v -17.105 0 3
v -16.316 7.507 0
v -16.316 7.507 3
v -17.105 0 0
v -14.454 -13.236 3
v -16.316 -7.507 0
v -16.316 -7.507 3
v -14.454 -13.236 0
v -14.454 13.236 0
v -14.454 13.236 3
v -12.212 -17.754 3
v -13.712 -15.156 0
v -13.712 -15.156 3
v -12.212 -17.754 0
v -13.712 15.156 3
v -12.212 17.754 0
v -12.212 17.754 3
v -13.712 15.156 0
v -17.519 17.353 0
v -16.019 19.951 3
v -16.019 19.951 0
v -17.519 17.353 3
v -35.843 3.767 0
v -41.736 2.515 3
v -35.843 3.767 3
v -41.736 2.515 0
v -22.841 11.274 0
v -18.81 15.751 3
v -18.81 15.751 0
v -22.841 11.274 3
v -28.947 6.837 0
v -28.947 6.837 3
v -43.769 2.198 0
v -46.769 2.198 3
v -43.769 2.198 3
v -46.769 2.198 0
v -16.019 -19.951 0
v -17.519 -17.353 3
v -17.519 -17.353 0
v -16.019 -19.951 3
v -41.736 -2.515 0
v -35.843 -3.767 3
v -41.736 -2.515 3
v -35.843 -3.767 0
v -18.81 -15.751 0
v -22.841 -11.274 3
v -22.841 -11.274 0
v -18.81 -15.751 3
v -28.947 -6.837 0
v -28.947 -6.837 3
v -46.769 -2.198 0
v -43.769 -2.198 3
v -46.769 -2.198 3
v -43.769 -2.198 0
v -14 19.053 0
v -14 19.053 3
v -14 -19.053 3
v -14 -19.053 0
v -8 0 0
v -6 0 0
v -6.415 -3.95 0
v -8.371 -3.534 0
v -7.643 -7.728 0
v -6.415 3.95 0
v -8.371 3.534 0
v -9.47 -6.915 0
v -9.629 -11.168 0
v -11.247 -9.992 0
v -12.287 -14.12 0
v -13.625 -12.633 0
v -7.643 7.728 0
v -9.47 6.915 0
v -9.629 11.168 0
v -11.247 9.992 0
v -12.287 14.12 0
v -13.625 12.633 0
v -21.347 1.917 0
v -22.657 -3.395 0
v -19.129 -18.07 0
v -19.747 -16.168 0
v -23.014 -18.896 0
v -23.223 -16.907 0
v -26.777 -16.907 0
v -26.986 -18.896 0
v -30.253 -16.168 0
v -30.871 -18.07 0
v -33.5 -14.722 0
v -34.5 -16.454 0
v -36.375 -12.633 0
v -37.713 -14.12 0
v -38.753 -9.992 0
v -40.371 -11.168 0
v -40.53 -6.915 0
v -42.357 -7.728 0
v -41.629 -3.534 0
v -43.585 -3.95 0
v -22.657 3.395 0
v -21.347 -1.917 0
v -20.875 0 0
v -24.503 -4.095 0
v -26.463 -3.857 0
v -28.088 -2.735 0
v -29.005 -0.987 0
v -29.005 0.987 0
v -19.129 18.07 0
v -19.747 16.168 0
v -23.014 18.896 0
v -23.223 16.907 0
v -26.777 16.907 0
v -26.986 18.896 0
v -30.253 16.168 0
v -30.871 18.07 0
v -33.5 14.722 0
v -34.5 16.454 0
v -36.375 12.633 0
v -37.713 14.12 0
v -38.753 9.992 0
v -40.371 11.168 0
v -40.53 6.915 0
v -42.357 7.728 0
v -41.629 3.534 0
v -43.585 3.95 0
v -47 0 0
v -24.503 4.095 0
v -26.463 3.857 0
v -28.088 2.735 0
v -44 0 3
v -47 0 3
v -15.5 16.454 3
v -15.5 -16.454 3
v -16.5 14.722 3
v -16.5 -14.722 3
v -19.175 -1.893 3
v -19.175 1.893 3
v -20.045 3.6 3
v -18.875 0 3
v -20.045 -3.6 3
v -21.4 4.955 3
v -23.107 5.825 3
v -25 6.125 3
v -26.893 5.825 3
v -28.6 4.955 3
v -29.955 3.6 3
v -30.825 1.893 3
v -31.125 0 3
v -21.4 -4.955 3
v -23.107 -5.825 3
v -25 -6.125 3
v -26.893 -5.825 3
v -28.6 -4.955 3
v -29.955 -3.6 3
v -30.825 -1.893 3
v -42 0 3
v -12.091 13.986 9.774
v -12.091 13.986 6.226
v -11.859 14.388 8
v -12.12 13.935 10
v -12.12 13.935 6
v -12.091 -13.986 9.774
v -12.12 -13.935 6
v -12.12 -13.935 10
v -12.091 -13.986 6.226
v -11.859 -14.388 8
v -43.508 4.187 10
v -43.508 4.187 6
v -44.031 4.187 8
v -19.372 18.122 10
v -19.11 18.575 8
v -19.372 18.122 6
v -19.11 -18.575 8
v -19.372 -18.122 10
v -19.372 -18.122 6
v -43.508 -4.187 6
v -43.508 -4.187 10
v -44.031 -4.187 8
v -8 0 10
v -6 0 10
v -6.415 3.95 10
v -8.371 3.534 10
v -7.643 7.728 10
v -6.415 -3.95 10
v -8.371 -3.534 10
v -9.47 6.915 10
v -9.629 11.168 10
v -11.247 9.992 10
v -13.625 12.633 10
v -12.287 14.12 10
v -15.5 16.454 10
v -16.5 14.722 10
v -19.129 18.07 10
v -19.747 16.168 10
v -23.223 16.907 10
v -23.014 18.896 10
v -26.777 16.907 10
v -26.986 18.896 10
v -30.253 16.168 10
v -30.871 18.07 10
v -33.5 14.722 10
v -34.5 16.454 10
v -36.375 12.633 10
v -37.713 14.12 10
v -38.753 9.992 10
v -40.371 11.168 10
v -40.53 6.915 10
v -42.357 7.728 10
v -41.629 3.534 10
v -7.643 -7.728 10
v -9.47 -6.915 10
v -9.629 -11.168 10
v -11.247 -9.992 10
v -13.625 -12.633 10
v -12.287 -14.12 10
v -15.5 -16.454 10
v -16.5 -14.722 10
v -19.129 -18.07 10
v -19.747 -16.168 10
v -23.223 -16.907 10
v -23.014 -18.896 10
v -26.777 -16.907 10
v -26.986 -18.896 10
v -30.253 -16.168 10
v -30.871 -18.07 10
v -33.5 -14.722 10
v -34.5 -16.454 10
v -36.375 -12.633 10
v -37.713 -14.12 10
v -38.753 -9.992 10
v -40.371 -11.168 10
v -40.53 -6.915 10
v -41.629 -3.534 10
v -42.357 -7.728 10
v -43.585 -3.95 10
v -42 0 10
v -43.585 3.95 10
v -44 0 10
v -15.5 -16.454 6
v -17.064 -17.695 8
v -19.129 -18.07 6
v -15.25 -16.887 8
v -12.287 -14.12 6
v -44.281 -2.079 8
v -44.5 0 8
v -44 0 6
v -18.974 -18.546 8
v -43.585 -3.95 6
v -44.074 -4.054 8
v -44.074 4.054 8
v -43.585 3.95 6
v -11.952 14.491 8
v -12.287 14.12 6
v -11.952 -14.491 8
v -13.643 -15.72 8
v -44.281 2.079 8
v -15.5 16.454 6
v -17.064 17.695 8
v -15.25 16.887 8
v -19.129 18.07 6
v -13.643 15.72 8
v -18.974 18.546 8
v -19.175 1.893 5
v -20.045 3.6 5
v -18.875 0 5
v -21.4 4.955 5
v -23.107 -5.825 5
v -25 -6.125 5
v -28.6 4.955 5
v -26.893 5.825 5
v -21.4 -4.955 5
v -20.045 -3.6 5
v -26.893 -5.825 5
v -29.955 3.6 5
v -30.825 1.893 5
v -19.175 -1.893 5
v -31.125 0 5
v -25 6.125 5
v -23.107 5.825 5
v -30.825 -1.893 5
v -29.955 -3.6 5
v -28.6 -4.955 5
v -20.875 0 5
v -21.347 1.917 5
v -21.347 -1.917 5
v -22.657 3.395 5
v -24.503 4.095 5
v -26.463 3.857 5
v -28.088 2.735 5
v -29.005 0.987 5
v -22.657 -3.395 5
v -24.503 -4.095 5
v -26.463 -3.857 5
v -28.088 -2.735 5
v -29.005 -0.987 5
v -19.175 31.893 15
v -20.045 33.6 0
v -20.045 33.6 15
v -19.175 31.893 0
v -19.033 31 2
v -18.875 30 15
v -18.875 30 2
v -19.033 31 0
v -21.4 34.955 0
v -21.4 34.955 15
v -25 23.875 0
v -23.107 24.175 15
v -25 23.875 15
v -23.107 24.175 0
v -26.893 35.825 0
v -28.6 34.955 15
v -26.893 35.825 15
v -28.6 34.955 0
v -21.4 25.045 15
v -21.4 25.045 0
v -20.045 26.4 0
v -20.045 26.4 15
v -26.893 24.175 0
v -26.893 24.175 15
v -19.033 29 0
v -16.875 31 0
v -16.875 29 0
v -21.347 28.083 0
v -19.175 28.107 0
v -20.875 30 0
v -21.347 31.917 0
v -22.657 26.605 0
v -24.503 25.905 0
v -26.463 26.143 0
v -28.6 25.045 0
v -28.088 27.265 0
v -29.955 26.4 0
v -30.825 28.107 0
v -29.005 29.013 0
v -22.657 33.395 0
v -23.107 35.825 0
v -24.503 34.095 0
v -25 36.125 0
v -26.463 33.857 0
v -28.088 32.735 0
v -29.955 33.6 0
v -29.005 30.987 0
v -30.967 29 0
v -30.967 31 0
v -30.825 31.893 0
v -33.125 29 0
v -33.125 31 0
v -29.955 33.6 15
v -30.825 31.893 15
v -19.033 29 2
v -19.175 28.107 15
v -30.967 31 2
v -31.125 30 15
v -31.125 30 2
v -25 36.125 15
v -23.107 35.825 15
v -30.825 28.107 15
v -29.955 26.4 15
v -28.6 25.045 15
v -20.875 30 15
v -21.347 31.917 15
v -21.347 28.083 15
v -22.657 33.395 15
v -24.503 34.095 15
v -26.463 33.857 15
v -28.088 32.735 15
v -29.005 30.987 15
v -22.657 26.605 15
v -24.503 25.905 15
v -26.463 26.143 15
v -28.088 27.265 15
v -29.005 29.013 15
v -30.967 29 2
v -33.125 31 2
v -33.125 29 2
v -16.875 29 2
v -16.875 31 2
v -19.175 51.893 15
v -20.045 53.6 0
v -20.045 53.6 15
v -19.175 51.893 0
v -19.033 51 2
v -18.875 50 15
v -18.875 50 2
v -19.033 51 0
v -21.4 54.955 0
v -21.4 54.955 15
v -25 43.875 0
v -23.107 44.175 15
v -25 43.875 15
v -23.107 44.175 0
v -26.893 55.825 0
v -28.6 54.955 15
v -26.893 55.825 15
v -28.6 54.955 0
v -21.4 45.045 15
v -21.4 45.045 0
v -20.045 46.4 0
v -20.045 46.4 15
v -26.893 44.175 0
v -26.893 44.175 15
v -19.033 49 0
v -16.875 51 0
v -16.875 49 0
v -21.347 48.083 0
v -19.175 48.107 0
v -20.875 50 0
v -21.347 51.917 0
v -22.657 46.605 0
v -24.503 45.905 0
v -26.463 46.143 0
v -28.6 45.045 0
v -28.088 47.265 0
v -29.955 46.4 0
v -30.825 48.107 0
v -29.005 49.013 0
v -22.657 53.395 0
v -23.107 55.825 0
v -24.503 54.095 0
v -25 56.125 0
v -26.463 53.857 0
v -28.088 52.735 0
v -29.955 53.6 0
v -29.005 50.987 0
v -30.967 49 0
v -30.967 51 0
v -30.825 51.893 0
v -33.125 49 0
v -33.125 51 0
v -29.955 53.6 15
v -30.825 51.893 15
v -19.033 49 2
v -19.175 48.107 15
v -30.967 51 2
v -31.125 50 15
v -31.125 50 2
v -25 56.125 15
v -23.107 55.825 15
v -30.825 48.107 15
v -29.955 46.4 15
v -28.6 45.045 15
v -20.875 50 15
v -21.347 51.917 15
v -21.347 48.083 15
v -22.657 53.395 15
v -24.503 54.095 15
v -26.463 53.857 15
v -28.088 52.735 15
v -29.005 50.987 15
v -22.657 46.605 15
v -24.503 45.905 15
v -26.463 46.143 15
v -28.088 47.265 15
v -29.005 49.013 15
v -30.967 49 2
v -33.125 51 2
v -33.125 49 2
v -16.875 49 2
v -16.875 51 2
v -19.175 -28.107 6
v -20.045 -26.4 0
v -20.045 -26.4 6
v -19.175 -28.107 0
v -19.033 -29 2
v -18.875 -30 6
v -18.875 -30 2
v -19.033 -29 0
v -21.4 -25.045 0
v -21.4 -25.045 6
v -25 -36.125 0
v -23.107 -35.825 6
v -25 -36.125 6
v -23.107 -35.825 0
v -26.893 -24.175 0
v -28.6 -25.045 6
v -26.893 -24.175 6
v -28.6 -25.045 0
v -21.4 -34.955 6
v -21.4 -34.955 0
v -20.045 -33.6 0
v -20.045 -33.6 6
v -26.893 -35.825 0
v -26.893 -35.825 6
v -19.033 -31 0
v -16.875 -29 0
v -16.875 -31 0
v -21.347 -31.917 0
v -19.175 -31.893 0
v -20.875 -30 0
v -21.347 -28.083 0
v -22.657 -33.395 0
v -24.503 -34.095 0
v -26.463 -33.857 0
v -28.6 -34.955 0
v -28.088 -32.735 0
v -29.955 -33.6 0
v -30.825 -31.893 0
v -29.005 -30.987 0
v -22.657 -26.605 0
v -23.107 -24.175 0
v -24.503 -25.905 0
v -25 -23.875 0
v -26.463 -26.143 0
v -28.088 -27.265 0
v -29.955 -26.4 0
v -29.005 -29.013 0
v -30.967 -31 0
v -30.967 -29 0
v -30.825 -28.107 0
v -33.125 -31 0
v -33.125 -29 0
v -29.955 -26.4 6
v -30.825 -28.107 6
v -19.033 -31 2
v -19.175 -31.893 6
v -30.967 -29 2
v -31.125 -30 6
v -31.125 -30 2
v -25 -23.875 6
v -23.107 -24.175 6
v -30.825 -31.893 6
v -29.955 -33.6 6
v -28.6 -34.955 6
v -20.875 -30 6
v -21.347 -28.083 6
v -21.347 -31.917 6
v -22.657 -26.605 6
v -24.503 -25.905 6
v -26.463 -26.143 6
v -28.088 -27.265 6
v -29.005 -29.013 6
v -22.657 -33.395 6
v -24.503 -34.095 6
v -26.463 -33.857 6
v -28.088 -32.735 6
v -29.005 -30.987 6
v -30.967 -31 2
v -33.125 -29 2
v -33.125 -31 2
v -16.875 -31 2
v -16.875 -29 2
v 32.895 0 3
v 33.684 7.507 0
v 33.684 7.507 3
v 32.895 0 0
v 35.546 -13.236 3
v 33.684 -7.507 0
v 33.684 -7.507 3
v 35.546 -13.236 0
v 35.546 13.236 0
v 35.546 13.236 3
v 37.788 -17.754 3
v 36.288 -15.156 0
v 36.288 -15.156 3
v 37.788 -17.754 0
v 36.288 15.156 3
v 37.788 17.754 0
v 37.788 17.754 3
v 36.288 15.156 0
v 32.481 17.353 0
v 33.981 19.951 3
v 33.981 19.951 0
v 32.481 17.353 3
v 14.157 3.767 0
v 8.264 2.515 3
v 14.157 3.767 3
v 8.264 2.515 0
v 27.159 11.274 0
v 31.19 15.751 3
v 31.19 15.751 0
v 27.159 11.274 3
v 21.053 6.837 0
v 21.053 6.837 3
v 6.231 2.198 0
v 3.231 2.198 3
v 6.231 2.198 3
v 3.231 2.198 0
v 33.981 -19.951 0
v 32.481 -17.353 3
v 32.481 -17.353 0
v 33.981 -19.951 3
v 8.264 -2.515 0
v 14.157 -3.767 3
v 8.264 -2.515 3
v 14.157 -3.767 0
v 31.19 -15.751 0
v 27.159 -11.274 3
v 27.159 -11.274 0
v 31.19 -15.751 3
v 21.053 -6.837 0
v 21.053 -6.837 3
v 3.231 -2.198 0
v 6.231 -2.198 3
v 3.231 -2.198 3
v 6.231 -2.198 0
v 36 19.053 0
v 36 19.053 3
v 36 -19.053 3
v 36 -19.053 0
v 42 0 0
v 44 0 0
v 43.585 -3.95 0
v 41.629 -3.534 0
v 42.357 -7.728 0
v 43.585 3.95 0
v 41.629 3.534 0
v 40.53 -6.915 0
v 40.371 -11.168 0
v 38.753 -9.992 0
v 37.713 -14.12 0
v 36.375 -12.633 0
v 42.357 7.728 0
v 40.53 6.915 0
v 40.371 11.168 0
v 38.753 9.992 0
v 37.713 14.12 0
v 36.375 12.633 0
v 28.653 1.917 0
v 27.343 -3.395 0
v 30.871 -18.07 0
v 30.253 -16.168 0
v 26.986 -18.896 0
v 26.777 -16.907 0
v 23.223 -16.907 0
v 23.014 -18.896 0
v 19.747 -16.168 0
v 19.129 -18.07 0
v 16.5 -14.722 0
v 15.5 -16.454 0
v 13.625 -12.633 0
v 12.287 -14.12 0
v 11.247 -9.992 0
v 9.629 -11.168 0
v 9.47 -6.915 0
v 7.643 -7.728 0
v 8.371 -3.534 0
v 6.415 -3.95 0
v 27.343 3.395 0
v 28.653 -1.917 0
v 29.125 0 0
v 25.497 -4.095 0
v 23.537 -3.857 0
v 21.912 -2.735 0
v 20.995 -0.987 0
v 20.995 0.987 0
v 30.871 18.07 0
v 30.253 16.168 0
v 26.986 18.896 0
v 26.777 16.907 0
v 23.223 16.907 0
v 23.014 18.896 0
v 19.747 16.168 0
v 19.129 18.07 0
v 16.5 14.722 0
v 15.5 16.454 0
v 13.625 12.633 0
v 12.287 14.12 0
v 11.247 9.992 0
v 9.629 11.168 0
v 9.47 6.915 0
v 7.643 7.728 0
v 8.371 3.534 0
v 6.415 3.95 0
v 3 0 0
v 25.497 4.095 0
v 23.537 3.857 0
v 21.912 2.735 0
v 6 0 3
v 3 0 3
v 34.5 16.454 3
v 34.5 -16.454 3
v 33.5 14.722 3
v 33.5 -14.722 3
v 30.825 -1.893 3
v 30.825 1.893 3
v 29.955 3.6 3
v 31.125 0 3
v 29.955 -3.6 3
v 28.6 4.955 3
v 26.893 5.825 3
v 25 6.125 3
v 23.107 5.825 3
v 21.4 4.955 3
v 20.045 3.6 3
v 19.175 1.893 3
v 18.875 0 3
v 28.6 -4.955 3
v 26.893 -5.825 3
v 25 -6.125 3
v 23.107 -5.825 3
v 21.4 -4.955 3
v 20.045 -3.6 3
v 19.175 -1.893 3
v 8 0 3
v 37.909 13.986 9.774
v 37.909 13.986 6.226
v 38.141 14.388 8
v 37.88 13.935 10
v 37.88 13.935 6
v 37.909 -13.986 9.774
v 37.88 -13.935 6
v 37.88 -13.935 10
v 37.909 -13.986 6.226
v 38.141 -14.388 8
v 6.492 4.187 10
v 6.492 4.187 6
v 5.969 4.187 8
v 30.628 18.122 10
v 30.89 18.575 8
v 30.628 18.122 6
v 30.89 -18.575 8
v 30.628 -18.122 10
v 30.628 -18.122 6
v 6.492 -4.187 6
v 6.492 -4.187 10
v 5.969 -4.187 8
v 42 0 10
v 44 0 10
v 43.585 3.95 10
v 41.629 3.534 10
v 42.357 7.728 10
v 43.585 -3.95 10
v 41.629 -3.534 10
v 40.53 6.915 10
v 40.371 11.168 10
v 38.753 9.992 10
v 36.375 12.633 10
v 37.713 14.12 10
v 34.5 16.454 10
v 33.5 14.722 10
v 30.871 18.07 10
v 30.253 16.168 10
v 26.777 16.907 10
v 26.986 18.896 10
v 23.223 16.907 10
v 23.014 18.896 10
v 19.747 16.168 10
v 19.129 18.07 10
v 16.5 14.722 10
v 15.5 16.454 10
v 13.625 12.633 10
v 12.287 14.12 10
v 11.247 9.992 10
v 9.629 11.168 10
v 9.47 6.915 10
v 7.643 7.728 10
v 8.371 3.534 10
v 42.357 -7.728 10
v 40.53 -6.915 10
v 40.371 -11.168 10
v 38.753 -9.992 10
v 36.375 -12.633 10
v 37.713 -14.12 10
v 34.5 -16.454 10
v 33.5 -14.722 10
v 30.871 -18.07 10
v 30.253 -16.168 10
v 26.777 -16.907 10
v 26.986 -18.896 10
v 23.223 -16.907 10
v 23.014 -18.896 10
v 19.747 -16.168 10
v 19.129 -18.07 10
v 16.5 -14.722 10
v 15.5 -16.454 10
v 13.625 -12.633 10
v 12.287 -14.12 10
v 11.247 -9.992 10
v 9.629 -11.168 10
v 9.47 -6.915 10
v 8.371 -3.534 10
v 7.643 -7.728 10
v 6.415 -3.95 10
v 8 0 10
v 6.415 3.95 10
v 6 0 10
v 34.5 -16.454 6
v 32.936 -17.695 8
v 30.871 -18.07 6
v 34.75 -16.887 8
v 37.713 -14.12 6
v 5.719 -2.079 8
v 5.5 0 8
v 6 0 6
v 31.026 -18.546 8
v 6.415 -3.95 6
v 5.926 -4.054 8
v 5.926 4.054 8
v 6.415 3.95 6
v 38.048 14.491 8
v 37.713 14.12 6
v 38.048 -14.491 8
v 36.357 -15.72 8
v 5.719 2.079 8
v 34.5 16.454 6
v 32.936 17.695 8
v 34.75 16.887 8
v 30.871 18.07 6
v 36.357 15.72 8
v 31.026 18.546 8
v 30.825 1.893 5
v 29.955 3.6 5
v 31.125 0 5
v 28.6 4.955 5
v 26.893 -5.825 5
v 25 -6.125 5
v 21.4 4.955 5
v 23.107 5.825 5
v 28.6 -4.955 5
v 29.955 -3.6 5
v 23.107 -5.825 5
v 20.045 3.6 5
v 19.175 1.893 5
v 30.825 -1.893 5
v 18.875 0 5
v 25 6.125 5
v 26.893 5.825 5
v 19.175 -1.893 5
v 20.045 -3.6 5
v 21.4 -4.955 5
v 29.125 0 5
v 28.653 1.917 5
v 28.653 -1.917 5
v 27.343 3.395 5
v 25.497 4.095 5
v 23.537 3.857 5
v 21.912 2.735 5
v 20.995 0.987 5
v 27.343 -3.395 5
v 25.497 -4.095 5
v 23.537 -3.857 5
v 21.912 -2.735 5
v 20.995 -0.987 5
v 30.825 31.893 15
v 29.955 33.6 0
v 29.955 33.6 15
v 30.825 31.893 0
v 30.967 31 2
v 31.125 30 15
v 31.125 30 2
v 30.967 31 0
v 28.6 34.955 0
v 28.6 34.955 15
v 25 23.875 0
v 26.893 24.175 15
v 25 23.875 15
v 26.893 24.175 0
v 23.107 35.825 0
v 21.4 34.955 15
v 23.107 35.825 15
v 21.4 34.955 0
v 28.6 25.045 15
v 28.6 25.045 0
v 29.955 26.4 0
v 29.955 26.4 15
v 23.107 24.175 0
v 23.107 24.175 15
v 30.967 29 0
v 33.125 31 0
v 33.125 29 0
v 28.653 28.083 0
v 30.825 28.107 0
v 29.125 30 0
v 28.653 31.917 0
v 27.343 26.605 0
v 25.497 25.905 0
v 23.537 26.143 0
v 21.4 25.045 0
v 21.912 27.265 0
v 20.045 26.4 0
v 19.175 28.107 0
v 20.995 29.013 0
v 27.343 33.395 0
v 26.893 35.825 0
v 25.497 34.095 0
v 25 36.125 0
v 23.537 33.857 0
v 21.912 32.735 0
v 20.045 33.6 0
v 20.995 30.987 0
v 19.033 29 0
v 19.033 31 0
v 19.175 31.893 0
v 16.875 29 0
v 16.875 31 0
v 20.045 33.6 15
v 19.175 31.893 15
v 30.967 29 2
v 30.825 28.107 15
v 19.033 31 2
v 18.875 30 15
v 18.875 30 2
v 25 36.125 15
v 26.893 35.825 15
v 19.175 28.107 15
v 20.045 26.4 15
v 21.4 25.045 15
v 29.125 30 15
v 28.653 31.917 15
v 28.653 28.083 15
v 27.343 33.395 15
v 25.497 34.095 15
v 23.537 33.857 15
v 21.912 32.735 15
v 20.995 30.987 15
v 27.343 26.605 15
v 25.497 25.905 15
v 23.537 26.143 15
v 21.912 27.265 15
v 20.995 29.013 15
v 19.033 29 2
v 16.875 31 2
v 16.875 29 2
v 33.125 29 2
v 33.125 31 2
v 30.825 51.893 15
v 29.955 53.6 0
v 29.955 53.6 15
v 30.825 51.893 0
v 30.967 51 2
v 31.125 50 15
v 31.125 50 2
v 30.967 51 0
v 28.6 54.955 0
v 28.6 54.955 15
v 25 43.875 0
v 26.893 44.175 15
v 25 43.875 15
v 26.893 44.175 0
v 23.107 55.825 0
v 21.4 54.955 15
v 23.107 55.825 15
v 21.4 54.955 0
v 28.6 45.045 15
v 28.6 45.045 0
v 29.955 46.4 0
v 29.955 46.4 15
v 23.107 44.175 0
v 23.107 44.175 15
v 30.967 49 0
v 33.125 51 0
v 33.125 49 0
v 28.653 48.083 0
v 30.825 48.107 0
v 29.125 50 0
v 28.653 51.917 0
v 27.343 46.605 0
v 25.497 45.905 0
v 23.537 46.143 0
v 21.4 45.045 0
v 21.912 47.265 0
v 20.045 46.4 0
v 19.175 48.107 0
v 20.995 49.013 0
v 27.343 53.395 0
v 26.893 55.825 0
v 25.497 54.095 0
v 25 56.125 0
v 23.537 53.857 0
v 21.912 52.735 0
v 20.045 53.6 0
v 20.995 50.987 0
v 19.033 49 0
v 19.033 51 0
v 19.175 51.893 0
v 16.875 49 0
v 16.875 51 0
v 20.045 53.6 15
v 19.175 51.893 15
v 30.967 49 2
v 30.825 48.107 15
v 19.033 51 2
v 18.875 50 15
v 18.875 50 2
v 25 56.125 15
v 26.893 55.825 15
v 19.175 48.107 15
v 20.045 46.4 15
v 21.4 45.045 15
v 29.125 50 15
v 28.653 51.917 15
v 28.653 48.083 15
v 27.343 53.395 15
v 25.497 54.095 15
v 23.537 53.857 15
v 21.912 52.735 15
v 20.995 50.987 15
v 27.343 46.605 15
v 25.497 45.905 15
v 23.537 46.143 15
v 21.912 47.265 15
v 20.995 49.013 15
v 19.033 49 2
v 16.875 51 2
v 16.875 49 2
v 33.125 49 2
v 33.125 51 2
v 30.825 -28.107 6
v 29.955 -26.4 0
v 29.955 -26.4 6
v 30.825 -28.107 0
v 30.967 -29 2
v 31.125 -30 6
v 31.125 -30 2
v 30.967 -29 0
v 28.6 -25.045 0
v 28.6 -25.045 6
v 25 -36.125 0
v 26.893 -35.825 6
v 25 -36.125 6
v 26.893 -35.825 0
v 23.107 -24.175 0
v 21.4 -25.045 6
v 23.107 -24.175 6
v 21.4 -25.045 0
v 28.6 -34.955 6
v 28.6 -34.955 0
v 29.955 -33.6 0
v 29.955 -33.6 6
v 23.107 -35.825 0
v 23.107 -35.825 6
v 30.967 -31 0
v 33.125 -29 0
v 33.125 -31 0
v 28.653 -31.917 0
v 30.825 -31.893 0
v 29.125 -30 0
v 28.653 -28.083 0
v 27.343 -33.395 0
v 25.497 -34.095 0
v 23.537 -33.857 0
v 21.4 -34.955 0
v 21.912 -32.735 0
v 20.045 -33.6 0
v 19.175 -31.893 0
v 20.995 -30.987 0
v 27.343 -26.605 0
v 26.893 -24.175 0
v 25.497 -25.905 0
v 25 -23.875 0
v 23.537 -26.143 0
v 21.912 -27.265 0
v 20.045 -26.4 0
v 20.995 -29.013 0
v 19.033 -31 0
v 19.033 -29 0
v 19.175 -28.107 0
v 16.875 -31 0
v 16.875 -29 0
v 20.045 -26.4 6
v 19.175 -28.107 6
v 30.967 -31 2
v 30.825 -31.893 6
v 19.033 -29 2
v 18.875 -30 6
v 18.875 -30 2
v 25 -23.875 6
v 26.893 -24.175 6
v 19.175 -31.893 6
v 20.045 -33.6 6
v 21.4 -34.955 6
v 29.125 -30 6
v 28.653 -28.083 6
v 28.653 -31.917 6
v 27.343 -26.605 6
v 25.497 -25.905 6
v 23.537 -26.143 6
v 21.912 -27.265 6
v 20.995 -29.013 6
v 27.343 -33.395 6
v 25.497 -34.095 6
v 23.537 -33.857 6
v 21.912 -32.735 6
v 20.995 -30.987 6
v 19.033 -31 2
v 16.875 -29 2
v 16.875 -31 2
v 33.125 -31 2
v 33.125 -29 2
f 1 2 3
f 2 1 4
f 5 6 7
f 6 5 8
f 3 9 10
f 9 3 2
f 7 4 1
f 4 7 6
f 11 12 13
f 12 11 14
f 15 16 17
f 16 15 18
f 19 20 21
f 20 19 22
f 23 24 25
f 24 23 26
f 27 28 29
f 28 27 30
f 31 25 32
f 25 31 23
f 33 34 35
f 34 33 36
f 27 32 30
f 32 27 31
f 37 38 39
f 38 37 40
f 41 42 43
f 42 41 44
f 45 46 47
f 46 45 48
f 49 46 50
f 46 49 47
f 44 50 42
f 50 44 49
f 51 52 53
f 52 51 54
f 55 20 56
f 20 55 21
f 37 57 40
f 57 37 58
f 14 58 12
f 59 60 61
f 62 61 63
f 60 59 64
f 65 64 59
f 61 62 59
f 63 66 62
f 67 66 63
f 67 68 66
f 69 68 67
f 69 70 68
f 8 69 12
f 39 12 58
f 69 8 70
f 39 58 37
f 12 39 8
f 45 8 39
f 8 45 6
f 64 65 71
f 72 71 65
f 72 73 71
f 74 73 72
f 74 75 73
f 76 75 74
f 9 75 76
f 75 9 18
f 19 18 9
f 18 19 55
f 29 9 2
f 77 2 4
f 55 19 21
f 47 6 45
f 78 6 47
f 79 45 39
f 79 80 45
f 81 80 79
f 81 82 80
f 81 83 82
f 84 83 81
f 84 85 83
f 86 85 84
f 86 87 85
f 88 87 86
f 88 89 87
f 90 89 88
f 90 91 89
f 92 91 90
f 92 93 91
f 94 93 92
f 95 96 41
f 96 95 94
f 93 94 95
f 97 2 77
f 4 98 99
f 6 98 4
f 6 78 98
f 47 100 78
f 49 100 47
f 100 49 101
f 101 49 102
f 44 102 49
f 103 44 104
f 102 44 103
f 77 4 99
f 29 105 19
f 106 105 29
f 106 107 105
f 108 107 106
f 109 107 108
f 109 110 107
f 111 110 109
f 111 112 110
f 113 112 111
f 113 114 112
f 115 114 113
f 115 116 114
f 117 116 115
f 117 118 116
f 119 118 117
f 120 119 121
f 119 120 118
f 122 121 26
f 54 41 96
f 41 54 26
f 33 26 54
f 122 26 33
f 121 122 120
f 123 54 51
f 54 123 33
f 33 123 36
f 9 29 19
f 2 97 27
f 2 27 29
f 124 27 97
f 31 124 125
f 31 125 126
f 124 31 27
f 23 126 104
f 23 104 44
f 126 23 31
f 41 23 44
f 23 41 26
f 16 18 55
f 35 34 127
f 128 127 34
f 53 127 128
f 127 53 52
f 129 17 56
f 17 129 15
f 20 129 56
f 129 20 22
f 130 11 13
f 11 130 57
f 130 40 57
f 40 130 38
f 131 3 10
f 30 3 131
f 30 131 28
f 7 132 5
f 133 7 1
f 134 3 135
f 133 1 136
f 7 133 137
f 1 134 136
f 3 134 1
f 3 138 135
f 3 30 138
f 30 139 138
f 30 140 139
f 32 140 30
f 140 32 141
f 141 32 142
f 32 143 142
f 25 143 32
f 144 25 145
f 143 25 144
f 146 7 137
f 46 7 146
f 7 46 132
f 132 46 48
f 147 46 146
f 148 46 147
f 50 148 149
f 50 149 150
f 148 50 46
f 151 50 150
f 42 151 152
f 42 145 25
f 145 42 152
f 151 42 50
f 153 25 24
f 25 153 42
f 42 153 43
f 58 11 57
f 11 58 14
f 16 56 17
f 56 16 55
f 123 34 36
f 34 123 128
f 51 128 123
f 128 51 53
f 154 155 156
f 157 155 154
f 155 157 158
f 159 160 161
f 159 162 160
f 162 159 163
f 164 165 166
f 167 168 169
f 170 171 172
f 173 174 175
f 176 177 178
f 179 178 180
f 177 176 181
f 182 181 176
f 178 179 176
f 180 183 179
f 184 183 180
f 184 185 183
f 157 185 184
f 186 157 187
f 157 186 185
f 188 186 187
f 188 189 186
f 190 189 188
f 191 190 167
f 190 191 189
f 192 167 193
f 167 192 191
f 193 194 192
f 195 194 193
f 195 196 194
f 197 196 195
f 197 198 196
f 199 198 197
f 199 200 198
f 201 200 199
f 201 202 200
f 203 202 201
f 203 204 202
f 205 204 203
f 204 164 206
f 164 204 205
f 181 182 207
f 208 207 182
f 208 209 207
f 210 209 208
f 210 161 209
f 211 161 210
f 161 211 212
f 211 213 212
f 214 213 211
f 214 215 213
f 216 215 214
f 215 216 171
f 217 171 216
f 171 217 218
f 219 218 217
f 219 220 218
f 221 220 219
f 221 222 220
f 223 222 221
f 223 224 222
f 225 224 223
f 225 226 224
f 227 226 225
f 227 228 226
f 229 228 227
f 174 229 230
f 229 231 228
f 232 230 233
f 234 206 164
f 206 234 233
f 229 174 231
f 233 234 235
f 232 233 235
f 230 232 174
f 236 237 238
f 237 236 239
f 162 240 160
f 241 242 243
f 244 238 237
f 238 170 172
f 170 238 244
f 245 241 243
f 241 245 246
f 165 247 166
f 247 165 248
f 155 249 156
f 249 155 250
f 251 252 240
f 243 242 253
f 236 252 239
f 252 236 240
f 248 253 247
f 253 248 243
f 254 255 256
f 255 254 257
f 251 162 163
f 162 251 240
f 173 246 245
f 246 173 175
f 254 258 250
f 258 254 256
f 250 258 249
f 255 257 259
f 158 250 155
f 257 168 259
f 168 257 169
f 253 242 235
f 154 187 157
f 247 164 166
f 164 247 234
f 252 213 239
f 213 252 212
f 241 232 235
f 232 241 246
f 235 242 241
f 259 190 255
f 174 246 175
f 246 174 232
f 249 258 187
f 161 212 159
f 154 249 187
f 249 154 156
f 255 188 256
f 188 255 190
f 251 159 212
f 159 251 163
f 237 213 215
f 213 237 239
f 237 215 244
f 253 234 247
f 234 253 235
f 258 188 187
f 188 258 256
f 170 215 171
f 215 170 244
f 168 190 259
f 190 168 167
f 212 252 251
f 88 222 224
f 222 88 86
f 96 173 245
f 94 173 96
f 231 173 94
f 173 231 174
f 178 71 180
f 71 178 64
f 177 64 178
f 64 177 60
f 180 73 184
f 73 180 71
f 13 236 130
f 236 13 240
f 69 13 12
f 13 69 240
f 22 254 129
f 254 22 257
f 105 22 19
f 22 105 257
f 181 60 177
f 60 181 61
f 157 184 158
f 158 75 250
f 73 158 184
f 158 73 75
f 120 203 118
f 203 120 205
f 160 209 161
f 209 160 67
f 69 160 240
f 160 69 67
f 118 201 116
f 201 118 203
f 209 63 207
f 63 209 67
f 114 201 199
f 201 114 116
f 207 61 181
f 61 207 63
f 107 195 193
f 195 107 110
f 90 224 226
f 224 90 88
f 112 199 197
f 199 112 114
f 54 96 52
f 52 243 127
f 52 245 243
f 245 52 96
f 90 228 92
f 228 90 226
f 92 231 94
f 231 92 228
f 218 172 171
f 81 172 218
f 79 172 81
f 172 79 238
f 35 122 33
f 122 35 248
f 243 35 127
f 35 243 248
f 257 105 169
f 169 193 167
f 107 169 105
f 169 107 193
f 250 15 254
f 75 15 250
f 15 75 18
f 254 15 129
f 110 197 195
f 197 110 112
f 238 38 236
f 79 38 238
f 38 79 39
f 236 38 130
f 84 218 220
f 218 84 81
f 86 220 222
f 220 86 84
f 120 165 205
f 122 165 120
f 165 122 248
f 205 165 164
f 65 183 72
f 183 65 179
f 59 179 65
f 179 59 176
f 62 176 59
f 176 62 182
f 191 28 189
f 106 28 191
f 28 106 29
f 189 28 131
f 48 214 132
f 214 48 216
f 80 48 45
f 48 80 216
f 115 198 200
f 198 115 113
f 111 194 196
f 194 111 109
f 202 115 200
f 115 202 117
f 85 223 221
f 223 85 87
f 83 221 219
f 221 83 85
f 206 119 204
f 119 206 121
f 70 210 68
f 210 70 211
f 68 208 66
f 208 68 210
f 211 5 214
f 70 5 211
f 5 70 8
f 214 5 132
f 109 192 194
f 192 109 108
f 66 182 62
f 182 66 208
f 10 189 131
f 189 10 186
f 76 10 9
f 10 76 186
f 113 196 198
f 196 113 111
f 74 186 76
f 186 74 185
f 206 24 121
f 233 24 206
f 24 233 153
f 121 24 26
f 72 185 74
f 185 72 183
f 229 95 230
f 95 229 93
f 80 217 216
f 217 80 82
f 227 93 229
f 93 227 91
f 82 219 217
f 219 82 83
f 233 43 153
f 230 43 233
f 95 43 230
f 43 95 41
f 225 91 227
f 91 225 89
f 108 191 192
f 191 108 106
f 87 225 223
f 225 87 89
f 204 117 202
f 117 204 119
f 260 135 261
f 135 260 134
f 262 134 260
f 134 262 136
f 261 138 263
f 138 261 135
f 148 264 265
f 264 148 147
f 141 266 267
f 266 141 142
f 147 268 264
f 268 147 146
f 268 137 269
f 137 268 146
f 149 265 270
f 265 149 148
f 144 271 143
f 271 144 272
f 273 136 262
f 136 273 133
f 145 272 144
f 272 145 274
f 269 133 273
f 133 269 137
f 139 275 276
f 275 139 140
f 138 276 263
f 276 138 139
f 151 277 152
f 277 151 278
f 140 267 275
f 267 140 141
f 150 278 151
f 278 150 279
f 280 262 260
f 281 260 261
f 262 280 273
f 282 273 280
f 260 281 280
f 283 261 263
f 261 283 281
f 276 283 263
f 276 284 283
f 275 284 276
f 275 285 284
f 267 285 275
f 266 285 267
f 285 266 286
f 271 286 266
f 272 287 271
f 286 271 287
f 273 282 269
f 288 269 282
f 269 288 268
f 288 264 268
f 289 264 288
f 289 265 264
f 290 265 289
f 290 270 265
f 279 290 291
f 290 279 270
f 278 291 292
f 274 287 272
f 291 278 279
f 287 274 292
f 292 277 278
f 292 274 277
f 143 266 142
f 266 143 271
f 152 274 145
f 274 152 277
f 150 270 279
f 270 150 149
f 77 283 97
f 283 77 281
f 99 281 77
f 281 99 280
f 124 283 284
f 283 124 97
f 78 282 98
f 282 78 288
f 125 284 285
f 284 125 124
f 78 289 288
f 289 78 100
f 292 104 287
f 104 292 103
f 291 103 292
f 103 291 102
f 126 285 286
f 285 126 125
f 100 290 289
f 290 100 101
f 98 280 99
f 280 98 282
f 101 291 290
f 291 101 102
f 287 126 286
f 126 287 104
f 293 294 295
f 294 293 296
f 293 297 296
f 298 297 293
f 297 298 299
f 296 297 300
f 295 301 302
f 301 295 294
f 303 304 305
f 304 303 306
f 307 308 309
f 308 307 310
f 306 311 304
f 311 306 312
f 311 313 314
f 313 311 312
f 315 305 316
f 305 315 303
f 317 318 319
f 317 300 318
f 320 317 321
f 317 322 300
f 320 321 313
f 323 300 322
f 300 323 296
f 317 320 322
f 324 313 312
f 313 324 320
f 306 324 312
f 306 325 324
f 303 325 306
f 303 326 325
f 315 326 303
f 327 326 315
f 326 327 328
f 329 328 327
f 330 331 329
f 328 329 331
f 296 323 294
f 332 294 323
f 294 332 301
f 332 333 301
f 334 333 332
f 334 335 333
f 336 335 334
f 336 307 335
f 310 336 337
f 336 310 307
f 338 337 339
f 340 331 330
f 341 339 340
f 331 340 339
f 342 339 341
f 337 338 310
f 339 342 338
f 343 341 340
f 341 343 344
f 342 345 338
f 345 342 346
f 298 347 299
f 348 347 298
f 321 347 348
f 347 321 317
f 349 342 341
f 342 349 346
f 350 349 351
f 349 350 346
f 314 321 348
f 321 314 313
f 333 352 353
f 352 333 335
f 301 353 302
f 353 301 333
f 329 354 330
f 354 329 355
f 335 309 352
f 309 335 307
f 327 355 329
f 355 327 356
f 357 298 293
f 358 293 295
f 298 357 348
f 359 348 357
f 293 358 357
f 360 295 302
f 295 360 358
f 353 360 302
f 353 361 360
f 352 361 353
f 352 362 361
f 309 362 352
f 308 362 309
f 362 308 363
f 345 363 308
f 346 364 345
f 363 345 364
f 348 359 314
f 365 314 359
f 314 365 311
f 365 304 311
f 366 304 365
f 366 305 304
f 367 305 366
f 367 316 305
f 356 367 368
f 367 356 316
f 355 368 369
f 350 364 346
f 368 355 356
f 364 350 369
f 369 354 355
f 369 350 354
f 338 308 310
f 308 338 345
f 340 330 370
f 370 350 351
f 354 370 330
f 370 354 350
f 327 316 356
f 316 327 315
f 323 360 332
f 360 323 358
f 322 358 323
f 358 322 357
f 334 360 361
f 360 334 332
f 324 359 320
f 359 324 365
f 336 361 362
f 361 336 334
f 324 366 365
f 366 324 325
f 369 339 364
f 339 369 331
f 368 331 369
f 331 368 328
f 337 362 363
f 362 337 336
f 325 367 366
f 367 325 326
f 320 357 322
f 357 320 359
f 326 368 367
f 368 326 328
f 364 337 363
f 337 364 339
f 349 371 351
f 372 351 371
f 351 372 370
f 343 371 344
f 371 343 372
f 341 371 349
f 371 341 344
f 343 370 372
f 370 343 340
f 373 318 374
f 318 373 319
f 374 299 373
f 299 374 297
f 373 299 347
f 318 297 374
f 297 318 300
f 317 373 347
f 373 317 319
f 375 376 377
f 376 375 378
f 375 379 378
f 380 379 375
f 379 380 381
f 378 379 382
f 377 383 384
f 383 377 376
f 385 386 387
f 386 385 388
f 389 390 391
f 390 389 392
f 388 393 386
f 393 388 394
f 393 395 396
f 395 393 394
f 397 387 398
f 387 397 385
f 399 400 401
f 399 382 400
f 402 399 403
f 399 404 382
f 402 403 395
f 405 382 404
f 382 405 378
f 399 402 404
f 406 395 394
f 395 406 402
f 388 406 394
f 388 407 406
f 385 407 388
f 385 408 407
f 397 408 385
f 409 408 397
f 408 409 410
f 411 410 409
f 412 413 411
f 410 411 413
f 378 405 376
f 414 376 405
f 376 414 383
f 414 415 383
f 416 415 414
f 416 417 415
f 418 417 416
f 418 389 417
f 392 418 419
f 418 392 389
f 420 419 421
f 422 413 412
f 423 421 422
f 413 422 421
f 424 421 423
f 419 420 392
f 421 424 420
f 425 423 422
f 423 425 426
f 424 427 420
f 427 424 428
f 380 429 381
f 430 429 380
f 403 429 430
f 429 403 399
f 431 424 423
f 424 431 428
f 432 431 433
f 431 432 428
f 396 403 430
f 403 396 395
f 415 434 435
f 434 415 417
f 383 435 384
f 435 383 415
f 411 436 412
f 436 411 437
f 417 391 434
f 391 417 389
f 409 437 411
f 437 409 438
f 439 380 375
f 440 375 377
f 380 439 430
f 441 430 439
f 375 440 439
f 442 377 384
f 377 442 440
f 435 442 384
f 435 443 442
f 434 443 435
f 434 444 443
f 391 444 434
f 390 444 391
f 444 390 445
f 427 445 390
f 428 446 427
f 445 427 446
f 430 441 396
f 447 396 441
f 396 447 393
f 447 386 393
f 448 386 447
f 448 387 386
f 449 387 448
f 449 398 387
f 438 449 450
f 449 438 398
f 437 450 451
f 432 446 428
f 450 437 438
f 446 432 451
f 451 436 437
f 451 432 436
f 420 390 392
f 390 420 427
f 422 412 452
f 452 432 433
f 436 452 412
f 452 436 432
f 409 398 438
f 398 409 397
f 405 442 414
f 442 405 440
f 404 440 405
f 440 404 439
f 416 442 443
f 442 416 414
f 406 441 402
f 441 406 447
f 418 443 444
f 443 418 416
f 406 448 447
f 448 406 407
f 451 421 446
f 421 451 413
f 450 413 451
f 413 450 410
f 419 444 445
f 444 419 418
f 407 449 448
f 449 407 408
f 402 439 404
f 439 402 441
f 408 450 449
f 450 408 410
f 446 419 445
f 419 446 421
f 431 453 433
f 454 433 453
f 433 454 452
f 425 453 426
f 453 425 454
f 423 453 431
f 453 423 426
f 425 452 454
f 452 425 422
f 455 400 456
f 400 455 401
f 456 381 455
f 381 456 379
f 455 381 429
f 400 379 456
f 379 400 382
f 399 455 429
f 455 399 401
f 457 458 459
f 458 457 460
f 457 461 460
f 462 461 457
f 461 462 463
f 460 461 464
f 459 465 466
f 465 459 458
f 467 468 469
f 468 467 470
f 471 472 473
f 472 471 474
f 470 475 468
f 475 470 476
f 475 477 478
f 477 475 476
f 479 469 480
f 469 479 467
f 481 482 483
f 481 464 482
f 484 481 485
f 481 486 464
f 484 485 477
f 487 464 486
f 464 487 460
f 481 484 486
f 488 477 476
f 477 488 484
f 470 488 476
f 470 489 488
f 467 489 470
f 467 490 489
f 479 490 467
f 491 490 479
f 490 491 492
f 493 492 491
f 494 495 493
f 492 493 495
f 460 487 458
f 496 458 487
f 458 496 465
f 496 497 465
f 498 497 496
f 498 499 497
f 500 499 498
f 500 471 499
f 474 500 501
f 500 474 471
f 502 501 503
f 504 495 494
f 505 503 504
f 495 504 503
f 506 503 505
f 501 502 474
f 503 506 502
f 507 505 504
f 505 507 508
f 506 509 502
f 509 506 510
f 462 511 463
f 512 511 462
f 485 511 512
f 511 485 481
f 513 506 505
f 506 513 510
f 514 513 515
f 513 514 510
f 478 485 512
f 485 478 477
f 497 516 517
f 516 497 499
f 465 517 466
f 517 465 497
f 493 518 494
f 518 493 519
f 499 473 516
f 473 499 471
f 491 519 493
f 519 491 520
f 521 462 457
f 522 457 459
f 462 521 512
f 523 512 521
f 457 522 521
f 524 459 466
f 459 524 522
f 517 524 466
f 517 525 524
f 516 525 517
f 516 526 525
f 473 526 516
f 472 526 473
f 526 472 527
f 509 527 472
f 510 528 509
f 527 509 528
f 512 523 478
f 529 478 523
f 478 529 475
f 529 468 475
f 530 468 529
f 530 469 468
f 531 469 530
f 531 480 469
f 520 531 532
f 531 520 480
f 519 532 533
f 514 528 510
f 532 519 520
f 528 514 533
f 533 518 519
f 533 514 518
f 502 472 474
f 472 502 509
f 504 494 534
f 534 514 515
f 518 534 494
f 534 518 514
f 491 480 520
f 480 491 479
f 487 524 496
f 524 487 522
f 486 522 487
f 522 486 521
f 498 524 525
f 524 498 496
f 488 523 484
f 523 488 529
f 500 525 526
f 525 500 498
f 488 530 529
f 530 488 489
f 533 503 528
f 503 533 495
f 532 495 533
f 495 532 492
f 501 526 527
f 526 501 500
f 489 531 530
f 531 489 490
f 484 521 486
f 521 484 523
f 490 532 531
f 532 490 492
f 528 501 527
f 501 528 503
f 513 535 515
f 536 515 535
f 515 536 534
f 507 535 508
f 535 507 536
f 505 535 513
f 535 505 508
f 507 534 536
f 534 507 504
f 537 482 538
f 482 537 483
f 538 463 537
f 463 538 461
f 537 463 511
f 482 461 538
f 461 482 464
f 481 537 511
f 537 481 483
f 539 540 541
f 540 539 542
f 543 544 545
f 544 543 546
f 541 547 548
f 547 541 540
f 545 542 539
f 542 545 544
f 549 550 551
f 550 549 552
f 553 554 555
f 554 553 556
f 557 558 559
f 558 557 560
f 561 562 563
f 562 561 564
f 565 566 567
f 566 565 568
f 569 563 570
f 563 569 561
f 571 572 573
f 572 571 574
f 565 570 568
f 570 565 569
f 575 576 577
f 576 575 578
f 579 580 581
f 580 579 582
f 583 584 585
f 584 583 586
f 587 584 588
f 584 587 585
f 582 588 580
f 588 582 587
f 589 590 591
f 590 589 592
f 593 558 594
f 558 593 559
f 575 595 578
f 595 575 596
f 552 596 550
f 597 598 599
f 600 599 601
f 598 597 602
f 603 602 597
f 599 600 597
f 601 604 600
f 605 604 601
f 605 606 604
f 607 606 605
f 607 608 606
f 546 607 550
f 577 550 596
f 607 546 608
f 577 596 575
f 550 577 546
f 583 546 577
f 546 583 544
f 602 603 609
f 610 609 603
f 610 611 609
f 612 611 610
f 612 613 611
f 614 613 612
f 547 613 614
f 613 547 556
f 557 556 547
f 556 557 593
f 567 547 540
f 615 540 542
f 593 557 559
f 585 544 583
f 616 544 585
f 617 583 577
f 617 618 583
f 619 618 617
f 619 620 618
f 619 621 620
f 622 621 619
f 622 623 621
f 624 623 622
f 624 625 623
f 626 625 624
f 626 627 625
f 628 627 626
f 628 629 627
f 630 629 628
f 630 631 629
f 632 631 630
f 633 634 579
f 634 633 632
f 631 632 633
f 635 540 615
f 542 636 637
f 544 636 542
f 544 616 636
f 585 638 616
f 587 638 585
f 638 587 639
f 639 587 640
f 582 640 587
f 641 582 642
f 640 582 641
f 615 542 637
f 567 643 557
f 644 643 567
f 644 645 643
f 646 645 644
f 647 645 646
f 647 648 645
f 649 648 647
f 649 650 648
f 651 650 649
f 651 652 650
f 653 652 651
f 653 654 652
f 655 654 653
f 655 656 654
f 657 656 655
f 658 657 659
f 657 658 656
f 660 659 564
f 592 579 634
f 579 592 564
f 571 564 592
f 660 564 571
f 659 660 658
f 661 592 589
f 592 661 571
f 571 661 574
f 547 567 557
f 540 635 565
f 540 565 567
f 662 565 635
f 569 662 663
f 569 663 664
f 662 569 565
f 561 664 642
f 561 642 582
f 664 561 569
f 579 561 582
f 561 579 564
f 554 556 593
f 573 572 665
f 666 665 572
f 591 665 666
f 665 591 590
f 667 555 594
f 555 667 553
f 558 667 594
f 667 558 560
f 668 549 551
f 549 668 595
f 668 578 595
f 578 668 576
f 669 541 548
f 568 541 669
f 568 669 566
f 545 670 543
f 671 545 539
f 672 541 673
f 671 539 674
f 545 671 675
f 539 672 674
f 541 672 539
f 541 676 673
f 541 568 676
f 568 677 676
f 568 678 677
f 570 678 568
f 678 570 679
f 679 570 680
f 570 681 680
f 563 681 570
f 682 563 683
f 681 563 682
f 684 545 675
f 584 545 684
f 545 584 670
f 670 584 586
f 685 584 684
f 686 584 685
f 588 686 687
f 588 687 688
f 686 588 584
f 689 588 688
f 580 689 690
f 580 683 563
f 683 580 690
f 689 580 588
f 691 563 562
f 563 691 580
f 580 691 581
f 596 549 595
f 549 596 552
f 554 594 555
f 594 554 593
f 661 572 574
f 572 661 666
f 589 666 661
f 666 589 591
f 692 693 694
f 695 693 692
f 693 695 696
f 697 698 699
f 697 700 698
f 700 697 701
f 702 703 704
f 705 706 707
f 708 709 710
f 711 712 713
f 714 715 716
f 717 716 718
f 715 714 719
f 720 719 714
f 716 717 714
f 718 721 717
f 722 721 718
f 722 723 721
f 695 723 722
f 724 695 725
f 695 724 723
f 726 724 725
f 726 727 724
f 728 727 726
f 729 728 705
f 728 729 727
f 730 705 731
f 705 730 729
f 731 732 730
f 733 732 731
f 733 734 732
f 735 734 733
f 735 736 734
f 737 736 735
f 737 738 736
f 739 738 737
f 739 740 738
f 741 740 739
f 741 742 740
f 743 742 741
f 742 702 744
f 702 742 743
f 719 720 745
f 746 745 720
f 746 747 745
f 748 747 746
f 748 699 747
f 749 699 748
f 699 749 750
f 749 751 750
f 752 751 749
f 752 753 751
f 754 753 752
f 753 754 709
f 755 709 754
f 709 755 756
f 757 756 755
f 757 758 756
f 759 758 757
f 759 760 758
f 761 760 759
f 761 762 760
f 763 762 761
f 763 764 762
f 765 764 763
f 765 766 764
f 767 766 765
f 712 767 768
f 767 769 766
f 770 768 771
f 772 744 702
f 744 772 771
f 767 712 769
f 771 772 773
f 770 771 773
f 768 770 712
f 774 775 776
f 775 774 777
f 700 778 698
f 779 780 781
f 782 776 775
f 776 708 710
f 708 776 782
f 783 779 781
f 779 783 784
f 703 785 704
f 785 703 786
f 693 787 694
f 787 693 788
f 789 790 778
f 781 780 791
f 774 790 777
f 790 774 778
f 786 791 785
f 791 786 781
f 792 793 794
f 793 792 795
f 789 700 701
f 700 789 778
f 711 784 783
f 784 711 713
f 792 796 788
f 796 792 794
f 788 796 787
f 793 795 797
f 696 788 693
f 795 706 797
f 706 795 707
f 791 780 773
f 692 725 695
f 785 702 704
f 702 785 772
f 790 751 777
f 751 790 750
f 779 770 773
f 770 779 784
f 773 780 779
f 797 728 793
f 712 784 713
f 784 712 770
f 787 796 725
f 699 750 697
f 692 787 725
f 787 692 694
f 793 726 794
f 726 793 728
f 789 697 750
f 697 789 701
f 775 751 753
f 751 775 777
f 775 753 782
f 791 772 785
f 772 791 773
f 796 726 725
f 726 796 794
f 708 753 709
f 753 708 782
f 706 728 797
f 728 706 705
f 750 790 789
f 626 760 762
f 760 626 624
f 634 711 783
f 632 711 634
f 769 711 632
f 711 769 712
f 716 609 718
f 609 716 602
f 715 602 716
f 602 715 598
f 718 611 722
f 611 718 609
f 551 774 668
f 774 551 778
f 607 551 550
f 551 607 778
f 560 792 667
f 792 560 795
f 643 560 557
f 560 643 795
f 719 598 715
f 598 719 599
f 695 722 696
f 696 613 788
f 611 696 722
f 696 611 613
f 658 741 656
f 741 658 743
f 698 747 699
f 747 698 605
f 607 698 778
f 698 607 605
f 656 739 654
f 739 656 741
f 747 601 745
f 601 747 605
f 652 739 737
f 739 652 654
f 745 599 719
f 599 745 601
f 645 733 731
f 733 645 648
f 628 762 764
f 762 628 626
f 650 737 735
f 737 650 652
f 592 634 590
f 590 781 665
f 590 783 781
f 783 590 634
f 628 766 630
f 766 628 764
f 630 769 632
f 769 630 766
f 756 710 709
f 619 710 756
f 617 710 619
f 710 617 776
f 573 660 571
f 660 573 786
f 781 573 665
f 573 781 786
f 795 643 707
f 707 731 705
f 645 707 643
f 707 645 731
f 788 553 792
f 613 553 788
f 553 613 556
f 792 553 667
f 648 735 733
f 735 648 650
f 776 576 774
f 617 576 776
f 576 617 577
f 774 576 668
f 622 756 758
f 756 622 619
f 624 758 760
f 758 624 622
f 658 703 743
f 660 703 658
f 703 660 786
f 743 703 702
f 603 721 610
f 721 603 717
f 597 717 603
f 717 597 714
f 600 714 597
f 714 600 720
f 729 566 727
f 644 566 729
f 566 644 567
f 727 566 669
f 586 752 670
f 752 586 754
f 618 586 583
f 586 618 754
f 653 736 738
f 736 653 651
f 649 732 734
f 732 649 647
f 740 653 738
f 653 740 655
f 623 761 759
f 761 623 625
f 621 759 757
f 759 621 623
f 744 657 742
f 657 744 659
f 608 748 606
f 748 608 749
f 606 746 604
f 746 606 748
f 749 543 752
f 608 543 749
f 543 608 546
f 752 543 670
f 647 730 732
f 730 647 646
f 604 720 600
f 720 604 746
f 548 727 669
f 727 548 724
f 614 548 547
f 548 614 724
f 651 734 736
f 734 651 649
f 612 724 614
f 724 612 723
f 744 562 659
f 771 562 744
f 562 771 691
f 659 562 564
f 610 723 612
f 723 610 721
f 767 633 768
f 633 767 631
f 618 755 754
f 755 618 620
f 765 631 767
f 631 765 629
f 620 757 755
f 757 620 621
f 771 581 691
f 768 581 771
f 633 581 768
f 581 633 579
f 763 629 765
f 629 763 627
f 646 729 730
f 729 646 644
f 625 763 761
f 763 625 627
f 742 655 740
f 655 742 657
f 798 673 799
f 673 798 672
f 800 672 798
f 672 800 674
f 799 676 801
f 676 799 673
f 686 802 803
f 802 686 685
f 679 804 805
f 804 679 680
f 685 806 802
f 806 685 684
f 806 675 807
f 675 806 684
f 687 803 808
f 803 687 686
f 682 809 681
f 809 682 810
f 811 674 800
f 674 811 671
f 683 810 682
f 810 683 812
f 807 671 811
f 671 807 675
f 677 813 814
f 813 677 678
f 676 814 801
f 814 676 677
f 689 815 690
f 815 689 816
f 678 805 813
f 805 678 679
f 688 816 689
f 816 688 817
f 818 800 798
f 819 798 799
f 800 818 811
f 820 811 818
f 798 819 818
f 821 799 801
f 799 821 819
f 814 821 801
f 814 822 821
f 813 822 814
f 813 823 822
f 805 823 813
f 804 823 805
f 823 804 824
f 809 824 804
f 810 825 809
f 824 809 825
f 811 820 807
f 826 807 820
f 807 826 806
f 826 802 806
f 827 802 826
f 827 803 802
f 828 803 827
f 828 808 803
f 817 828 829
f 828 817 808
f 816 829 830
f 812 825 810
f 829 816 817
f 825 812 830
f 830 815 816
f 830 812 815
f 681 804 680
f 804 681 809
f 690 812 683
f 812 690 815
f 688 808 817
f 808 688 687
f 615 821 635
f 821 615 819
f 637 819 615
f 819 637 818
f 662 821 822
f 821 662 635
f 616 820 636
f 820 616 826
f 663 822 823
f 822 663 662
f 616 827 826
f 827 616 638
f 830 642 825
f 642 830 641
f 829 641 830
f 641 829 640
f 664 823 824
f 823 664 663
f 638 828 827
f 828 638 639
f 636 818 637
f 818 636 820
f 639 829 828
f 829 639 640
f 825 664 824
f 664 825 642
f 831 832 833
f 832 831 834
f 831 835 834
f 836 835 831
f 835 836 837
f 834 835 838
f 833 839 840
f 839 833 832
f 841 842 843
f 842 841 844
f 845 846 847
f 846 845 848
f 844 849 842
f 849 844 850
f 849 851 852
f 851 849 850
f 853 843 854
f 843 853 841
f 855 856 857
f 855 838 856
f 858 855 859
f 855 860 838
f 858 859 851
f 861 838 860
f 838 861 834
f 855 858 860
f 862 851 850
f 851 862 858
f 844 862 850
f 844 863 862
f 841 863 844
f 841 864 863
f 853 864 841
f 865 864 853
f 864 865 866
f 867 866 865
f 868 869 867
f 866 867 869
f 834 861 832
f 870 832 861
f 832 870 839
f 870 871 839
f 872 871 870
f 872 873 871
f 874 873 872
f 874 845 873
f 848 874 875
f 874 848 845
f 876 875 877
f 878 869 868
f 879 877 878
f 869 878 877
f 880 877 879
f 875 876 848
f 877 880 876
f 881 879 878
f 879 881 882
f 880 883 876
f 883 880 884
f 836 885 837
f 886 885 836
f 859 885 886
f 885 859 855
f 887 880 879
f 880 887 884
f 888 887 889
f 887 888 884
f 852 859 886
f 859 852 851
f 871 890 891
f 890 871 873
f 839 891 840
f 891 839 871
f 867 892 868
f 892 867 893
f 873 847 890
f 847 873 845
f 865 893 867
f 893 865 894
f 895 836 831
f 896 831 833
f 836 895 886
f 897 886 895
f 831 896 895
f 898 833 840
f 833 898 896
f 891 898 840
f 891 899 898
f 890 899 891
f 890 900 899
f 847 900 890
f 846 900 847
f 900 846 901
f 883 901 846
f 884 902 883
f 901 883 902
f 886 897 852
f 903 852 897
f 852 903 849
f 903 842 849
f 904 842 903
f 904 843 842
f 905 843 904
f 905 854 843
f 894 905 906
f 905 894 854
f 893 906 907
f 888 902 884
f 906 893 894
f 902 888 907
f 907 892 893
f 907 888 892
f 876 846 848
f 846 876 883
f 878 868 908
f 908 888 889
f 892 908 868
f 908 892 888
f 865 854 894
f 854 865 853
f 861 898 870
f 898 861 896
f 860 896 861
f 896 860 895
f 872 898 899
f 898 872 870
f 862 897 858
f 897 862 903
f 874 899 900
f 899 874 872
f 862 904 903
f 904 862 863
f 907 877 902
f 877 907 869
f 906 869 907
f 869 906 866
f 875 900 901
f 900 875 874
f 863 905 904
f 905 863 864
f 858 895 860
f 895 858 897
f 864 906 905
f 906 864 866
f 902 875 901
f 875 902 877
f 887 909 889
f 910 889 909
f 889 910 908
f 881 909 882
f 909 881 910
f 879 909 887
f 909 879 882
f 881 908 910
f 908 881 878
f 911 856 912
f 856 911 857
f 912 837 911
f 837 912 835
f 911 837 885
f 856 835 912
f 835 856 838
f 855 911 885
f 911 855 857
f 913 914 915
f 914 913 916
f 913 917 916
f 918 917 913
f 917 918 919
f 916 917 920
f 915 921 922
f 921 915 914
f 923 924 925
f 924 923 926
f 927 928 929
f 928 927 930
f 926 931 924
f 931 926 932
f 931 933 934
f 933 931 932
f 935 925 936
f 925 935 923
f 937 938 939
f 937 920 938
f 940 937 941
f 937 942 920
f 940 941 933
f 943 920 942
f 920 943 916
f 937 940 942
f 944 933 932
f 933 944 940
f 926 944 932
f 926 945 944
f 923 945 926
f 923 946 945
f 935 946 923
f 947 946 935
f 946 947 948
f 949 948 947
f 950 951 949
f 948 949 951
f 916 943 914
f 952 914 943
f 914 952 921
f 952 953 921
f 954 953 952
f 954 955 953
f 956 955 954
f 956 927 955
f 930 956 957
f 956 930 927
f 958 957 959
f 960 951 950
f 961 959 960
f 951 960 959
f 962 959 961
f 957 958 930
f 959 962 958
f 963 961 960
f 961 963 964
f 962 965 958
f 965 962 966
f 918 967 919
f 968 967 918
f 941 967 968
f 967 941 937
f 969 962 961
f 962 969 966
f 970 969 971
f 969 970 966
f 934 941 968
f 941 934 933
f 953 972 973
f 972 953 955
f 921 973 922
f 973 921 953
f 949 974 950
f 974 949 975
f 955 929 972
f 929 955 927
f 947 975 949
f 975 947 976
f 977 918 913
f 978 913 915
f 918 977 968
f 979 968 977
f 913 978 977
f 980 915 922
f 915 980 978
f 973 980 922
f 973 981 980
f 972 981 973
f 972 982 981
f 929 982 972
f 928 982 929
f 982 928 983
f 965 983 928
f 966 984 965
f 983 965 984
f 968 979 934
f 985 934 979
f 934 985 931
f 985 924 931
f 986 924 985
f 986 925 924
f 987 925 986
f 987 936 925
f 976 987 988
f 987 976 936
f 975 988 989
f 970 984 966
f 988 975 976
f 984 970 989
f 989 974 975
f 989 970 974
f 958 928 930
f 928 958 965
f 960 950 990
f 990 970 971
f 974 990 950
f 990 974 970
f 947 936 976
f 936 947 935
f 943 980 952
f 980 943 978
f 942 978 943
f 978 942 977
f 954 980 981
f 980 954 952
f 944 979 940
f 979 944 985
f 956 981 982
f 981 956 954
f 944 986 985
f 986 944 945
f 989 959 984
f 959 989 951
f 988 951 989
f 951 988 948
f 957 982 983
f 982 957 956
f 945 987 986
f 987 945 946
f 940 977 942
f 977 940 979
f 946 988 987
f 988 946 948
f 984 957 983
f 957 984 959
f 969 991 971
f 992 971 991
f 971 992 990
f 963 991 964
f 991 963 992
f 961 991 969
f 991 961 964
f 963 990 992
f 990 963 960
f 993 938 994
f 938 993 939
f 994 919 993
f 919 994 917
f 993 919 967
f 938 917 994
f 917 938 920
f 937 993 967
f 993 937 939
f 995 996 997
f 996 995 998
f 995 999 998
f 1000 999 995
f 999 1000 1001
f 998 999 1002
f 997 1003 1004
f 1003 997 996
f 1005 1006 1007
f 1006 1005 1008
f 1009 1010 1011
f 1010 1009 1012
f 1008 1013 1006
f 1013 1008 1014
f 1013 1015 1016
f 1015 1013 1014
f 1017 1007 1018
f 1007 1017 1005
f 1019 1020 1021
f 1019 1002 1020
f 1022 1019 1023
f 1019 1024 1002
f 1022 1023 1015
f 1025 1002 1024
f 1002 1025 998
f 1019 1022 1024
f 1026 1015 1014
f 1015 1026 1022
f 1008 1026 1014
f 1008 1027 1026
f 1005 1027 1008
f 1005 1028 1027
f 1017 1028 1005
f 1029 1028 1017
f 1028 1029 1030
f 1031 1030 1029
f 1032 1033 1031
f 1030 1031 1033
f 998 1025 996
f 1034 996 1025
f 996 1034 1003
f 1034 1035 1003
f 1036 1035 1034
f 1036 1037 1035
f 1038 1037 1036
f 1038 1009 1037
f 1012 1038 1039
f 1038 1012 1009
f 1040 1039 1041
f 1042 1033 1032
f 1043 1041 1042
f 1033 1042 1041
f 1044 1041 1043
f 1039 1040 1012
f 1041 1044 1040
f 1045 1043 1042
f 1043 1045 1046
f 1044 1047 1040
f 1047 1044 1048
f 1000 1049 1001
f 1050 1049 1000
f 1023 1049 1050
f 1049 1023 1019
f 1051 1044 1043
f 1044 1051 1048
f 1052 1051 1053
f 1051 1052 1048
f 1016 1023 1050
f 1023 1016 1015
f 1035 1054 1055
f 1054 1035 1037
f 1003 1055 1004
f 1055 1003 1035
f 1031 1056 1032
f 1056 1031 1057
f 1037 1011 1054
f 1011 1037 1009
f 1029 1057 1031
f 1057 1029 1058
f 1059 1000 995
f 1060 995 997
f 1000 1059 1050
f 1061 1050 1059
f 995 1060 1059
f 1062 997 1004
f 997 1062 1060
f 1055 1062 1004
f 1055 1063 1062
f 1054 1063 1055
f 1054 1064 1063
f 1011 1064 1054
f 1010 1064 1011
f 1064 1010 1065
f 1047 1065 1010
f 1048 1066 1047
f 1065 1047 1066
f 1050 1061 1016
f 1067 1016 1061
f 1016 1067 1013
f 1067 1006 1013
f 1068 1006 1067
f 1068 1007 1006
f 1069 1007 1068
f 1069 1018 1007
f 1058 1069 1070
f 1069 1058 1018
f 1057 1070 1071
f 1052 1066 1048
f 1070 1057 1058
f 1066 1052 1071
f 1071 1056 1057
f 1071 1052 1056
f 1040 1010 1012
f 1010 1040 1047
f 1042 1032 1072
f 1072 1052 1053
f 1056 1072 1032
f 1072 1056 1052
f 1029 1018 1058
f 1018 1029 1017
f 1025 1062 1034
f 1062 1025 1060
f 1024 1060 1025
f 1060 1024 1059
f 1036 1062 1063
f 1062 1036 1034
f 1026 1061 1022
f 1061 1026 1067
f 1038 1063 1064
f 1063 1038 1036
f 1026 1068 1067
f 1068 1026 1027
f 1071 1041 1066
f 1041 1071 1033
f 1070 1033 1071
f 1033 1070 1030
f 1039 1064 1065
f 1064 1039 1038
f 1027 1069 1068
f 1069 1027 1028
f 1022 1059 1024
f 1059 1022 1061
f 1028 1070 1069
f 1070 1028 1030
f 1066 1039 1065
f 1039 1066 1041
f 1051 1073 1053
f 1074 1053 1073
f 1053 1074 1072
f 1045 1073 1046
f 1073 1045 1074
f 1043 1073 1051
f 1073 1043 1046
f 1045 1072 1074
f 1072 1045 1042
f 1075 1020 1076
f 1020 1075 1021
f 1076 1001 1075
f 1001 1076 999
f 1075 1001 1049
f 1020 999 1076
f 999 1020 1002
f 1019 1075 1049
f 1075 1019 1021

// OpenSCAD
module tube(od, id, l)
{
    d = 1;
    difference()
    {
        cylinder(r=od/2, h=l);
        translate([0,0,-d]) cylinder(r=id/2, h=l+2*d);
    }
}

module threespokes(od, et, t)
{
    d = 1;
    difference()
    {
        cylinder(r=od/2, h=t);
        for (a=[0,120,240])
            translate([od*cos(a),od*sin(a),-d])
                cylinder(r=0.5*(sqrt(3)*od-et), h=t+d*2);
    }
}


module SpoolHolder(rd, rt, hd, ht, ad, at)
{
    d  = 1;
    t  = 2.0;  // thickness of hub tube
    bh = 0.5;  // height of retaining bump
    bt = 4;    // thickness of retaining bump
    b2 = bh*2;
    // Outer rim
    difference()
    {
        union()
        {
            threespokes(rd, 4, rt);
            difference()
            {
                union()
                {
                    cylinder(r=hd/2, h=ht);
                    translate([0,0,ht-bt]) 
                        intersection()
                        {
                            cylinder(r1=hd/2, r2=hd/2+b2, h=bt);
                            cylinder(r1=hd/2+b2, r2=hd/2, h=bt);
                            threespokes(rd, 8, bt);
                        }
                }
                translate([0,0,-d]) 
                    cylinder(r=(hd/2)-t, h=ht+d);
            }
            cylinder(r=(ad/2)+t, h=at);
        }
        translate([0,0,-d]) 
            cylinder(r=ad/2, h=at+2*d);    
    }
}

module SpoolSpacer(ad,l)
{
    t = 2;
    tube(ad+2*t, ad, l);
    // Add lumps to help hold tube when drilling out to clean hole
    translate([-((ad+t)/2)-1.5*t,-t/2,0]) cube([1.5*t,t,t]);
    translate([((ad+t)/2),-t/2,0]) cube([1.5*t,t,t]);
}

axledia = 8+0.25;

// Lay down 2-off 38mm hubs and spacers
for (x = [-25,25])
{
    translate([x,0,0])
    {
        SpoolHolder(38+6, 3, 38, 10, axledia, 5);
        translate([0,30,0]) SpoolSpacer(axledia, 15) ;
        translate([0,50,0]) SpoolSpacer(axledia, 15) ;
        translate([0,-30,0]) SpoolSpacer(axledia, 6) ;
    }
}

// threespokes(20, 3, 5);
